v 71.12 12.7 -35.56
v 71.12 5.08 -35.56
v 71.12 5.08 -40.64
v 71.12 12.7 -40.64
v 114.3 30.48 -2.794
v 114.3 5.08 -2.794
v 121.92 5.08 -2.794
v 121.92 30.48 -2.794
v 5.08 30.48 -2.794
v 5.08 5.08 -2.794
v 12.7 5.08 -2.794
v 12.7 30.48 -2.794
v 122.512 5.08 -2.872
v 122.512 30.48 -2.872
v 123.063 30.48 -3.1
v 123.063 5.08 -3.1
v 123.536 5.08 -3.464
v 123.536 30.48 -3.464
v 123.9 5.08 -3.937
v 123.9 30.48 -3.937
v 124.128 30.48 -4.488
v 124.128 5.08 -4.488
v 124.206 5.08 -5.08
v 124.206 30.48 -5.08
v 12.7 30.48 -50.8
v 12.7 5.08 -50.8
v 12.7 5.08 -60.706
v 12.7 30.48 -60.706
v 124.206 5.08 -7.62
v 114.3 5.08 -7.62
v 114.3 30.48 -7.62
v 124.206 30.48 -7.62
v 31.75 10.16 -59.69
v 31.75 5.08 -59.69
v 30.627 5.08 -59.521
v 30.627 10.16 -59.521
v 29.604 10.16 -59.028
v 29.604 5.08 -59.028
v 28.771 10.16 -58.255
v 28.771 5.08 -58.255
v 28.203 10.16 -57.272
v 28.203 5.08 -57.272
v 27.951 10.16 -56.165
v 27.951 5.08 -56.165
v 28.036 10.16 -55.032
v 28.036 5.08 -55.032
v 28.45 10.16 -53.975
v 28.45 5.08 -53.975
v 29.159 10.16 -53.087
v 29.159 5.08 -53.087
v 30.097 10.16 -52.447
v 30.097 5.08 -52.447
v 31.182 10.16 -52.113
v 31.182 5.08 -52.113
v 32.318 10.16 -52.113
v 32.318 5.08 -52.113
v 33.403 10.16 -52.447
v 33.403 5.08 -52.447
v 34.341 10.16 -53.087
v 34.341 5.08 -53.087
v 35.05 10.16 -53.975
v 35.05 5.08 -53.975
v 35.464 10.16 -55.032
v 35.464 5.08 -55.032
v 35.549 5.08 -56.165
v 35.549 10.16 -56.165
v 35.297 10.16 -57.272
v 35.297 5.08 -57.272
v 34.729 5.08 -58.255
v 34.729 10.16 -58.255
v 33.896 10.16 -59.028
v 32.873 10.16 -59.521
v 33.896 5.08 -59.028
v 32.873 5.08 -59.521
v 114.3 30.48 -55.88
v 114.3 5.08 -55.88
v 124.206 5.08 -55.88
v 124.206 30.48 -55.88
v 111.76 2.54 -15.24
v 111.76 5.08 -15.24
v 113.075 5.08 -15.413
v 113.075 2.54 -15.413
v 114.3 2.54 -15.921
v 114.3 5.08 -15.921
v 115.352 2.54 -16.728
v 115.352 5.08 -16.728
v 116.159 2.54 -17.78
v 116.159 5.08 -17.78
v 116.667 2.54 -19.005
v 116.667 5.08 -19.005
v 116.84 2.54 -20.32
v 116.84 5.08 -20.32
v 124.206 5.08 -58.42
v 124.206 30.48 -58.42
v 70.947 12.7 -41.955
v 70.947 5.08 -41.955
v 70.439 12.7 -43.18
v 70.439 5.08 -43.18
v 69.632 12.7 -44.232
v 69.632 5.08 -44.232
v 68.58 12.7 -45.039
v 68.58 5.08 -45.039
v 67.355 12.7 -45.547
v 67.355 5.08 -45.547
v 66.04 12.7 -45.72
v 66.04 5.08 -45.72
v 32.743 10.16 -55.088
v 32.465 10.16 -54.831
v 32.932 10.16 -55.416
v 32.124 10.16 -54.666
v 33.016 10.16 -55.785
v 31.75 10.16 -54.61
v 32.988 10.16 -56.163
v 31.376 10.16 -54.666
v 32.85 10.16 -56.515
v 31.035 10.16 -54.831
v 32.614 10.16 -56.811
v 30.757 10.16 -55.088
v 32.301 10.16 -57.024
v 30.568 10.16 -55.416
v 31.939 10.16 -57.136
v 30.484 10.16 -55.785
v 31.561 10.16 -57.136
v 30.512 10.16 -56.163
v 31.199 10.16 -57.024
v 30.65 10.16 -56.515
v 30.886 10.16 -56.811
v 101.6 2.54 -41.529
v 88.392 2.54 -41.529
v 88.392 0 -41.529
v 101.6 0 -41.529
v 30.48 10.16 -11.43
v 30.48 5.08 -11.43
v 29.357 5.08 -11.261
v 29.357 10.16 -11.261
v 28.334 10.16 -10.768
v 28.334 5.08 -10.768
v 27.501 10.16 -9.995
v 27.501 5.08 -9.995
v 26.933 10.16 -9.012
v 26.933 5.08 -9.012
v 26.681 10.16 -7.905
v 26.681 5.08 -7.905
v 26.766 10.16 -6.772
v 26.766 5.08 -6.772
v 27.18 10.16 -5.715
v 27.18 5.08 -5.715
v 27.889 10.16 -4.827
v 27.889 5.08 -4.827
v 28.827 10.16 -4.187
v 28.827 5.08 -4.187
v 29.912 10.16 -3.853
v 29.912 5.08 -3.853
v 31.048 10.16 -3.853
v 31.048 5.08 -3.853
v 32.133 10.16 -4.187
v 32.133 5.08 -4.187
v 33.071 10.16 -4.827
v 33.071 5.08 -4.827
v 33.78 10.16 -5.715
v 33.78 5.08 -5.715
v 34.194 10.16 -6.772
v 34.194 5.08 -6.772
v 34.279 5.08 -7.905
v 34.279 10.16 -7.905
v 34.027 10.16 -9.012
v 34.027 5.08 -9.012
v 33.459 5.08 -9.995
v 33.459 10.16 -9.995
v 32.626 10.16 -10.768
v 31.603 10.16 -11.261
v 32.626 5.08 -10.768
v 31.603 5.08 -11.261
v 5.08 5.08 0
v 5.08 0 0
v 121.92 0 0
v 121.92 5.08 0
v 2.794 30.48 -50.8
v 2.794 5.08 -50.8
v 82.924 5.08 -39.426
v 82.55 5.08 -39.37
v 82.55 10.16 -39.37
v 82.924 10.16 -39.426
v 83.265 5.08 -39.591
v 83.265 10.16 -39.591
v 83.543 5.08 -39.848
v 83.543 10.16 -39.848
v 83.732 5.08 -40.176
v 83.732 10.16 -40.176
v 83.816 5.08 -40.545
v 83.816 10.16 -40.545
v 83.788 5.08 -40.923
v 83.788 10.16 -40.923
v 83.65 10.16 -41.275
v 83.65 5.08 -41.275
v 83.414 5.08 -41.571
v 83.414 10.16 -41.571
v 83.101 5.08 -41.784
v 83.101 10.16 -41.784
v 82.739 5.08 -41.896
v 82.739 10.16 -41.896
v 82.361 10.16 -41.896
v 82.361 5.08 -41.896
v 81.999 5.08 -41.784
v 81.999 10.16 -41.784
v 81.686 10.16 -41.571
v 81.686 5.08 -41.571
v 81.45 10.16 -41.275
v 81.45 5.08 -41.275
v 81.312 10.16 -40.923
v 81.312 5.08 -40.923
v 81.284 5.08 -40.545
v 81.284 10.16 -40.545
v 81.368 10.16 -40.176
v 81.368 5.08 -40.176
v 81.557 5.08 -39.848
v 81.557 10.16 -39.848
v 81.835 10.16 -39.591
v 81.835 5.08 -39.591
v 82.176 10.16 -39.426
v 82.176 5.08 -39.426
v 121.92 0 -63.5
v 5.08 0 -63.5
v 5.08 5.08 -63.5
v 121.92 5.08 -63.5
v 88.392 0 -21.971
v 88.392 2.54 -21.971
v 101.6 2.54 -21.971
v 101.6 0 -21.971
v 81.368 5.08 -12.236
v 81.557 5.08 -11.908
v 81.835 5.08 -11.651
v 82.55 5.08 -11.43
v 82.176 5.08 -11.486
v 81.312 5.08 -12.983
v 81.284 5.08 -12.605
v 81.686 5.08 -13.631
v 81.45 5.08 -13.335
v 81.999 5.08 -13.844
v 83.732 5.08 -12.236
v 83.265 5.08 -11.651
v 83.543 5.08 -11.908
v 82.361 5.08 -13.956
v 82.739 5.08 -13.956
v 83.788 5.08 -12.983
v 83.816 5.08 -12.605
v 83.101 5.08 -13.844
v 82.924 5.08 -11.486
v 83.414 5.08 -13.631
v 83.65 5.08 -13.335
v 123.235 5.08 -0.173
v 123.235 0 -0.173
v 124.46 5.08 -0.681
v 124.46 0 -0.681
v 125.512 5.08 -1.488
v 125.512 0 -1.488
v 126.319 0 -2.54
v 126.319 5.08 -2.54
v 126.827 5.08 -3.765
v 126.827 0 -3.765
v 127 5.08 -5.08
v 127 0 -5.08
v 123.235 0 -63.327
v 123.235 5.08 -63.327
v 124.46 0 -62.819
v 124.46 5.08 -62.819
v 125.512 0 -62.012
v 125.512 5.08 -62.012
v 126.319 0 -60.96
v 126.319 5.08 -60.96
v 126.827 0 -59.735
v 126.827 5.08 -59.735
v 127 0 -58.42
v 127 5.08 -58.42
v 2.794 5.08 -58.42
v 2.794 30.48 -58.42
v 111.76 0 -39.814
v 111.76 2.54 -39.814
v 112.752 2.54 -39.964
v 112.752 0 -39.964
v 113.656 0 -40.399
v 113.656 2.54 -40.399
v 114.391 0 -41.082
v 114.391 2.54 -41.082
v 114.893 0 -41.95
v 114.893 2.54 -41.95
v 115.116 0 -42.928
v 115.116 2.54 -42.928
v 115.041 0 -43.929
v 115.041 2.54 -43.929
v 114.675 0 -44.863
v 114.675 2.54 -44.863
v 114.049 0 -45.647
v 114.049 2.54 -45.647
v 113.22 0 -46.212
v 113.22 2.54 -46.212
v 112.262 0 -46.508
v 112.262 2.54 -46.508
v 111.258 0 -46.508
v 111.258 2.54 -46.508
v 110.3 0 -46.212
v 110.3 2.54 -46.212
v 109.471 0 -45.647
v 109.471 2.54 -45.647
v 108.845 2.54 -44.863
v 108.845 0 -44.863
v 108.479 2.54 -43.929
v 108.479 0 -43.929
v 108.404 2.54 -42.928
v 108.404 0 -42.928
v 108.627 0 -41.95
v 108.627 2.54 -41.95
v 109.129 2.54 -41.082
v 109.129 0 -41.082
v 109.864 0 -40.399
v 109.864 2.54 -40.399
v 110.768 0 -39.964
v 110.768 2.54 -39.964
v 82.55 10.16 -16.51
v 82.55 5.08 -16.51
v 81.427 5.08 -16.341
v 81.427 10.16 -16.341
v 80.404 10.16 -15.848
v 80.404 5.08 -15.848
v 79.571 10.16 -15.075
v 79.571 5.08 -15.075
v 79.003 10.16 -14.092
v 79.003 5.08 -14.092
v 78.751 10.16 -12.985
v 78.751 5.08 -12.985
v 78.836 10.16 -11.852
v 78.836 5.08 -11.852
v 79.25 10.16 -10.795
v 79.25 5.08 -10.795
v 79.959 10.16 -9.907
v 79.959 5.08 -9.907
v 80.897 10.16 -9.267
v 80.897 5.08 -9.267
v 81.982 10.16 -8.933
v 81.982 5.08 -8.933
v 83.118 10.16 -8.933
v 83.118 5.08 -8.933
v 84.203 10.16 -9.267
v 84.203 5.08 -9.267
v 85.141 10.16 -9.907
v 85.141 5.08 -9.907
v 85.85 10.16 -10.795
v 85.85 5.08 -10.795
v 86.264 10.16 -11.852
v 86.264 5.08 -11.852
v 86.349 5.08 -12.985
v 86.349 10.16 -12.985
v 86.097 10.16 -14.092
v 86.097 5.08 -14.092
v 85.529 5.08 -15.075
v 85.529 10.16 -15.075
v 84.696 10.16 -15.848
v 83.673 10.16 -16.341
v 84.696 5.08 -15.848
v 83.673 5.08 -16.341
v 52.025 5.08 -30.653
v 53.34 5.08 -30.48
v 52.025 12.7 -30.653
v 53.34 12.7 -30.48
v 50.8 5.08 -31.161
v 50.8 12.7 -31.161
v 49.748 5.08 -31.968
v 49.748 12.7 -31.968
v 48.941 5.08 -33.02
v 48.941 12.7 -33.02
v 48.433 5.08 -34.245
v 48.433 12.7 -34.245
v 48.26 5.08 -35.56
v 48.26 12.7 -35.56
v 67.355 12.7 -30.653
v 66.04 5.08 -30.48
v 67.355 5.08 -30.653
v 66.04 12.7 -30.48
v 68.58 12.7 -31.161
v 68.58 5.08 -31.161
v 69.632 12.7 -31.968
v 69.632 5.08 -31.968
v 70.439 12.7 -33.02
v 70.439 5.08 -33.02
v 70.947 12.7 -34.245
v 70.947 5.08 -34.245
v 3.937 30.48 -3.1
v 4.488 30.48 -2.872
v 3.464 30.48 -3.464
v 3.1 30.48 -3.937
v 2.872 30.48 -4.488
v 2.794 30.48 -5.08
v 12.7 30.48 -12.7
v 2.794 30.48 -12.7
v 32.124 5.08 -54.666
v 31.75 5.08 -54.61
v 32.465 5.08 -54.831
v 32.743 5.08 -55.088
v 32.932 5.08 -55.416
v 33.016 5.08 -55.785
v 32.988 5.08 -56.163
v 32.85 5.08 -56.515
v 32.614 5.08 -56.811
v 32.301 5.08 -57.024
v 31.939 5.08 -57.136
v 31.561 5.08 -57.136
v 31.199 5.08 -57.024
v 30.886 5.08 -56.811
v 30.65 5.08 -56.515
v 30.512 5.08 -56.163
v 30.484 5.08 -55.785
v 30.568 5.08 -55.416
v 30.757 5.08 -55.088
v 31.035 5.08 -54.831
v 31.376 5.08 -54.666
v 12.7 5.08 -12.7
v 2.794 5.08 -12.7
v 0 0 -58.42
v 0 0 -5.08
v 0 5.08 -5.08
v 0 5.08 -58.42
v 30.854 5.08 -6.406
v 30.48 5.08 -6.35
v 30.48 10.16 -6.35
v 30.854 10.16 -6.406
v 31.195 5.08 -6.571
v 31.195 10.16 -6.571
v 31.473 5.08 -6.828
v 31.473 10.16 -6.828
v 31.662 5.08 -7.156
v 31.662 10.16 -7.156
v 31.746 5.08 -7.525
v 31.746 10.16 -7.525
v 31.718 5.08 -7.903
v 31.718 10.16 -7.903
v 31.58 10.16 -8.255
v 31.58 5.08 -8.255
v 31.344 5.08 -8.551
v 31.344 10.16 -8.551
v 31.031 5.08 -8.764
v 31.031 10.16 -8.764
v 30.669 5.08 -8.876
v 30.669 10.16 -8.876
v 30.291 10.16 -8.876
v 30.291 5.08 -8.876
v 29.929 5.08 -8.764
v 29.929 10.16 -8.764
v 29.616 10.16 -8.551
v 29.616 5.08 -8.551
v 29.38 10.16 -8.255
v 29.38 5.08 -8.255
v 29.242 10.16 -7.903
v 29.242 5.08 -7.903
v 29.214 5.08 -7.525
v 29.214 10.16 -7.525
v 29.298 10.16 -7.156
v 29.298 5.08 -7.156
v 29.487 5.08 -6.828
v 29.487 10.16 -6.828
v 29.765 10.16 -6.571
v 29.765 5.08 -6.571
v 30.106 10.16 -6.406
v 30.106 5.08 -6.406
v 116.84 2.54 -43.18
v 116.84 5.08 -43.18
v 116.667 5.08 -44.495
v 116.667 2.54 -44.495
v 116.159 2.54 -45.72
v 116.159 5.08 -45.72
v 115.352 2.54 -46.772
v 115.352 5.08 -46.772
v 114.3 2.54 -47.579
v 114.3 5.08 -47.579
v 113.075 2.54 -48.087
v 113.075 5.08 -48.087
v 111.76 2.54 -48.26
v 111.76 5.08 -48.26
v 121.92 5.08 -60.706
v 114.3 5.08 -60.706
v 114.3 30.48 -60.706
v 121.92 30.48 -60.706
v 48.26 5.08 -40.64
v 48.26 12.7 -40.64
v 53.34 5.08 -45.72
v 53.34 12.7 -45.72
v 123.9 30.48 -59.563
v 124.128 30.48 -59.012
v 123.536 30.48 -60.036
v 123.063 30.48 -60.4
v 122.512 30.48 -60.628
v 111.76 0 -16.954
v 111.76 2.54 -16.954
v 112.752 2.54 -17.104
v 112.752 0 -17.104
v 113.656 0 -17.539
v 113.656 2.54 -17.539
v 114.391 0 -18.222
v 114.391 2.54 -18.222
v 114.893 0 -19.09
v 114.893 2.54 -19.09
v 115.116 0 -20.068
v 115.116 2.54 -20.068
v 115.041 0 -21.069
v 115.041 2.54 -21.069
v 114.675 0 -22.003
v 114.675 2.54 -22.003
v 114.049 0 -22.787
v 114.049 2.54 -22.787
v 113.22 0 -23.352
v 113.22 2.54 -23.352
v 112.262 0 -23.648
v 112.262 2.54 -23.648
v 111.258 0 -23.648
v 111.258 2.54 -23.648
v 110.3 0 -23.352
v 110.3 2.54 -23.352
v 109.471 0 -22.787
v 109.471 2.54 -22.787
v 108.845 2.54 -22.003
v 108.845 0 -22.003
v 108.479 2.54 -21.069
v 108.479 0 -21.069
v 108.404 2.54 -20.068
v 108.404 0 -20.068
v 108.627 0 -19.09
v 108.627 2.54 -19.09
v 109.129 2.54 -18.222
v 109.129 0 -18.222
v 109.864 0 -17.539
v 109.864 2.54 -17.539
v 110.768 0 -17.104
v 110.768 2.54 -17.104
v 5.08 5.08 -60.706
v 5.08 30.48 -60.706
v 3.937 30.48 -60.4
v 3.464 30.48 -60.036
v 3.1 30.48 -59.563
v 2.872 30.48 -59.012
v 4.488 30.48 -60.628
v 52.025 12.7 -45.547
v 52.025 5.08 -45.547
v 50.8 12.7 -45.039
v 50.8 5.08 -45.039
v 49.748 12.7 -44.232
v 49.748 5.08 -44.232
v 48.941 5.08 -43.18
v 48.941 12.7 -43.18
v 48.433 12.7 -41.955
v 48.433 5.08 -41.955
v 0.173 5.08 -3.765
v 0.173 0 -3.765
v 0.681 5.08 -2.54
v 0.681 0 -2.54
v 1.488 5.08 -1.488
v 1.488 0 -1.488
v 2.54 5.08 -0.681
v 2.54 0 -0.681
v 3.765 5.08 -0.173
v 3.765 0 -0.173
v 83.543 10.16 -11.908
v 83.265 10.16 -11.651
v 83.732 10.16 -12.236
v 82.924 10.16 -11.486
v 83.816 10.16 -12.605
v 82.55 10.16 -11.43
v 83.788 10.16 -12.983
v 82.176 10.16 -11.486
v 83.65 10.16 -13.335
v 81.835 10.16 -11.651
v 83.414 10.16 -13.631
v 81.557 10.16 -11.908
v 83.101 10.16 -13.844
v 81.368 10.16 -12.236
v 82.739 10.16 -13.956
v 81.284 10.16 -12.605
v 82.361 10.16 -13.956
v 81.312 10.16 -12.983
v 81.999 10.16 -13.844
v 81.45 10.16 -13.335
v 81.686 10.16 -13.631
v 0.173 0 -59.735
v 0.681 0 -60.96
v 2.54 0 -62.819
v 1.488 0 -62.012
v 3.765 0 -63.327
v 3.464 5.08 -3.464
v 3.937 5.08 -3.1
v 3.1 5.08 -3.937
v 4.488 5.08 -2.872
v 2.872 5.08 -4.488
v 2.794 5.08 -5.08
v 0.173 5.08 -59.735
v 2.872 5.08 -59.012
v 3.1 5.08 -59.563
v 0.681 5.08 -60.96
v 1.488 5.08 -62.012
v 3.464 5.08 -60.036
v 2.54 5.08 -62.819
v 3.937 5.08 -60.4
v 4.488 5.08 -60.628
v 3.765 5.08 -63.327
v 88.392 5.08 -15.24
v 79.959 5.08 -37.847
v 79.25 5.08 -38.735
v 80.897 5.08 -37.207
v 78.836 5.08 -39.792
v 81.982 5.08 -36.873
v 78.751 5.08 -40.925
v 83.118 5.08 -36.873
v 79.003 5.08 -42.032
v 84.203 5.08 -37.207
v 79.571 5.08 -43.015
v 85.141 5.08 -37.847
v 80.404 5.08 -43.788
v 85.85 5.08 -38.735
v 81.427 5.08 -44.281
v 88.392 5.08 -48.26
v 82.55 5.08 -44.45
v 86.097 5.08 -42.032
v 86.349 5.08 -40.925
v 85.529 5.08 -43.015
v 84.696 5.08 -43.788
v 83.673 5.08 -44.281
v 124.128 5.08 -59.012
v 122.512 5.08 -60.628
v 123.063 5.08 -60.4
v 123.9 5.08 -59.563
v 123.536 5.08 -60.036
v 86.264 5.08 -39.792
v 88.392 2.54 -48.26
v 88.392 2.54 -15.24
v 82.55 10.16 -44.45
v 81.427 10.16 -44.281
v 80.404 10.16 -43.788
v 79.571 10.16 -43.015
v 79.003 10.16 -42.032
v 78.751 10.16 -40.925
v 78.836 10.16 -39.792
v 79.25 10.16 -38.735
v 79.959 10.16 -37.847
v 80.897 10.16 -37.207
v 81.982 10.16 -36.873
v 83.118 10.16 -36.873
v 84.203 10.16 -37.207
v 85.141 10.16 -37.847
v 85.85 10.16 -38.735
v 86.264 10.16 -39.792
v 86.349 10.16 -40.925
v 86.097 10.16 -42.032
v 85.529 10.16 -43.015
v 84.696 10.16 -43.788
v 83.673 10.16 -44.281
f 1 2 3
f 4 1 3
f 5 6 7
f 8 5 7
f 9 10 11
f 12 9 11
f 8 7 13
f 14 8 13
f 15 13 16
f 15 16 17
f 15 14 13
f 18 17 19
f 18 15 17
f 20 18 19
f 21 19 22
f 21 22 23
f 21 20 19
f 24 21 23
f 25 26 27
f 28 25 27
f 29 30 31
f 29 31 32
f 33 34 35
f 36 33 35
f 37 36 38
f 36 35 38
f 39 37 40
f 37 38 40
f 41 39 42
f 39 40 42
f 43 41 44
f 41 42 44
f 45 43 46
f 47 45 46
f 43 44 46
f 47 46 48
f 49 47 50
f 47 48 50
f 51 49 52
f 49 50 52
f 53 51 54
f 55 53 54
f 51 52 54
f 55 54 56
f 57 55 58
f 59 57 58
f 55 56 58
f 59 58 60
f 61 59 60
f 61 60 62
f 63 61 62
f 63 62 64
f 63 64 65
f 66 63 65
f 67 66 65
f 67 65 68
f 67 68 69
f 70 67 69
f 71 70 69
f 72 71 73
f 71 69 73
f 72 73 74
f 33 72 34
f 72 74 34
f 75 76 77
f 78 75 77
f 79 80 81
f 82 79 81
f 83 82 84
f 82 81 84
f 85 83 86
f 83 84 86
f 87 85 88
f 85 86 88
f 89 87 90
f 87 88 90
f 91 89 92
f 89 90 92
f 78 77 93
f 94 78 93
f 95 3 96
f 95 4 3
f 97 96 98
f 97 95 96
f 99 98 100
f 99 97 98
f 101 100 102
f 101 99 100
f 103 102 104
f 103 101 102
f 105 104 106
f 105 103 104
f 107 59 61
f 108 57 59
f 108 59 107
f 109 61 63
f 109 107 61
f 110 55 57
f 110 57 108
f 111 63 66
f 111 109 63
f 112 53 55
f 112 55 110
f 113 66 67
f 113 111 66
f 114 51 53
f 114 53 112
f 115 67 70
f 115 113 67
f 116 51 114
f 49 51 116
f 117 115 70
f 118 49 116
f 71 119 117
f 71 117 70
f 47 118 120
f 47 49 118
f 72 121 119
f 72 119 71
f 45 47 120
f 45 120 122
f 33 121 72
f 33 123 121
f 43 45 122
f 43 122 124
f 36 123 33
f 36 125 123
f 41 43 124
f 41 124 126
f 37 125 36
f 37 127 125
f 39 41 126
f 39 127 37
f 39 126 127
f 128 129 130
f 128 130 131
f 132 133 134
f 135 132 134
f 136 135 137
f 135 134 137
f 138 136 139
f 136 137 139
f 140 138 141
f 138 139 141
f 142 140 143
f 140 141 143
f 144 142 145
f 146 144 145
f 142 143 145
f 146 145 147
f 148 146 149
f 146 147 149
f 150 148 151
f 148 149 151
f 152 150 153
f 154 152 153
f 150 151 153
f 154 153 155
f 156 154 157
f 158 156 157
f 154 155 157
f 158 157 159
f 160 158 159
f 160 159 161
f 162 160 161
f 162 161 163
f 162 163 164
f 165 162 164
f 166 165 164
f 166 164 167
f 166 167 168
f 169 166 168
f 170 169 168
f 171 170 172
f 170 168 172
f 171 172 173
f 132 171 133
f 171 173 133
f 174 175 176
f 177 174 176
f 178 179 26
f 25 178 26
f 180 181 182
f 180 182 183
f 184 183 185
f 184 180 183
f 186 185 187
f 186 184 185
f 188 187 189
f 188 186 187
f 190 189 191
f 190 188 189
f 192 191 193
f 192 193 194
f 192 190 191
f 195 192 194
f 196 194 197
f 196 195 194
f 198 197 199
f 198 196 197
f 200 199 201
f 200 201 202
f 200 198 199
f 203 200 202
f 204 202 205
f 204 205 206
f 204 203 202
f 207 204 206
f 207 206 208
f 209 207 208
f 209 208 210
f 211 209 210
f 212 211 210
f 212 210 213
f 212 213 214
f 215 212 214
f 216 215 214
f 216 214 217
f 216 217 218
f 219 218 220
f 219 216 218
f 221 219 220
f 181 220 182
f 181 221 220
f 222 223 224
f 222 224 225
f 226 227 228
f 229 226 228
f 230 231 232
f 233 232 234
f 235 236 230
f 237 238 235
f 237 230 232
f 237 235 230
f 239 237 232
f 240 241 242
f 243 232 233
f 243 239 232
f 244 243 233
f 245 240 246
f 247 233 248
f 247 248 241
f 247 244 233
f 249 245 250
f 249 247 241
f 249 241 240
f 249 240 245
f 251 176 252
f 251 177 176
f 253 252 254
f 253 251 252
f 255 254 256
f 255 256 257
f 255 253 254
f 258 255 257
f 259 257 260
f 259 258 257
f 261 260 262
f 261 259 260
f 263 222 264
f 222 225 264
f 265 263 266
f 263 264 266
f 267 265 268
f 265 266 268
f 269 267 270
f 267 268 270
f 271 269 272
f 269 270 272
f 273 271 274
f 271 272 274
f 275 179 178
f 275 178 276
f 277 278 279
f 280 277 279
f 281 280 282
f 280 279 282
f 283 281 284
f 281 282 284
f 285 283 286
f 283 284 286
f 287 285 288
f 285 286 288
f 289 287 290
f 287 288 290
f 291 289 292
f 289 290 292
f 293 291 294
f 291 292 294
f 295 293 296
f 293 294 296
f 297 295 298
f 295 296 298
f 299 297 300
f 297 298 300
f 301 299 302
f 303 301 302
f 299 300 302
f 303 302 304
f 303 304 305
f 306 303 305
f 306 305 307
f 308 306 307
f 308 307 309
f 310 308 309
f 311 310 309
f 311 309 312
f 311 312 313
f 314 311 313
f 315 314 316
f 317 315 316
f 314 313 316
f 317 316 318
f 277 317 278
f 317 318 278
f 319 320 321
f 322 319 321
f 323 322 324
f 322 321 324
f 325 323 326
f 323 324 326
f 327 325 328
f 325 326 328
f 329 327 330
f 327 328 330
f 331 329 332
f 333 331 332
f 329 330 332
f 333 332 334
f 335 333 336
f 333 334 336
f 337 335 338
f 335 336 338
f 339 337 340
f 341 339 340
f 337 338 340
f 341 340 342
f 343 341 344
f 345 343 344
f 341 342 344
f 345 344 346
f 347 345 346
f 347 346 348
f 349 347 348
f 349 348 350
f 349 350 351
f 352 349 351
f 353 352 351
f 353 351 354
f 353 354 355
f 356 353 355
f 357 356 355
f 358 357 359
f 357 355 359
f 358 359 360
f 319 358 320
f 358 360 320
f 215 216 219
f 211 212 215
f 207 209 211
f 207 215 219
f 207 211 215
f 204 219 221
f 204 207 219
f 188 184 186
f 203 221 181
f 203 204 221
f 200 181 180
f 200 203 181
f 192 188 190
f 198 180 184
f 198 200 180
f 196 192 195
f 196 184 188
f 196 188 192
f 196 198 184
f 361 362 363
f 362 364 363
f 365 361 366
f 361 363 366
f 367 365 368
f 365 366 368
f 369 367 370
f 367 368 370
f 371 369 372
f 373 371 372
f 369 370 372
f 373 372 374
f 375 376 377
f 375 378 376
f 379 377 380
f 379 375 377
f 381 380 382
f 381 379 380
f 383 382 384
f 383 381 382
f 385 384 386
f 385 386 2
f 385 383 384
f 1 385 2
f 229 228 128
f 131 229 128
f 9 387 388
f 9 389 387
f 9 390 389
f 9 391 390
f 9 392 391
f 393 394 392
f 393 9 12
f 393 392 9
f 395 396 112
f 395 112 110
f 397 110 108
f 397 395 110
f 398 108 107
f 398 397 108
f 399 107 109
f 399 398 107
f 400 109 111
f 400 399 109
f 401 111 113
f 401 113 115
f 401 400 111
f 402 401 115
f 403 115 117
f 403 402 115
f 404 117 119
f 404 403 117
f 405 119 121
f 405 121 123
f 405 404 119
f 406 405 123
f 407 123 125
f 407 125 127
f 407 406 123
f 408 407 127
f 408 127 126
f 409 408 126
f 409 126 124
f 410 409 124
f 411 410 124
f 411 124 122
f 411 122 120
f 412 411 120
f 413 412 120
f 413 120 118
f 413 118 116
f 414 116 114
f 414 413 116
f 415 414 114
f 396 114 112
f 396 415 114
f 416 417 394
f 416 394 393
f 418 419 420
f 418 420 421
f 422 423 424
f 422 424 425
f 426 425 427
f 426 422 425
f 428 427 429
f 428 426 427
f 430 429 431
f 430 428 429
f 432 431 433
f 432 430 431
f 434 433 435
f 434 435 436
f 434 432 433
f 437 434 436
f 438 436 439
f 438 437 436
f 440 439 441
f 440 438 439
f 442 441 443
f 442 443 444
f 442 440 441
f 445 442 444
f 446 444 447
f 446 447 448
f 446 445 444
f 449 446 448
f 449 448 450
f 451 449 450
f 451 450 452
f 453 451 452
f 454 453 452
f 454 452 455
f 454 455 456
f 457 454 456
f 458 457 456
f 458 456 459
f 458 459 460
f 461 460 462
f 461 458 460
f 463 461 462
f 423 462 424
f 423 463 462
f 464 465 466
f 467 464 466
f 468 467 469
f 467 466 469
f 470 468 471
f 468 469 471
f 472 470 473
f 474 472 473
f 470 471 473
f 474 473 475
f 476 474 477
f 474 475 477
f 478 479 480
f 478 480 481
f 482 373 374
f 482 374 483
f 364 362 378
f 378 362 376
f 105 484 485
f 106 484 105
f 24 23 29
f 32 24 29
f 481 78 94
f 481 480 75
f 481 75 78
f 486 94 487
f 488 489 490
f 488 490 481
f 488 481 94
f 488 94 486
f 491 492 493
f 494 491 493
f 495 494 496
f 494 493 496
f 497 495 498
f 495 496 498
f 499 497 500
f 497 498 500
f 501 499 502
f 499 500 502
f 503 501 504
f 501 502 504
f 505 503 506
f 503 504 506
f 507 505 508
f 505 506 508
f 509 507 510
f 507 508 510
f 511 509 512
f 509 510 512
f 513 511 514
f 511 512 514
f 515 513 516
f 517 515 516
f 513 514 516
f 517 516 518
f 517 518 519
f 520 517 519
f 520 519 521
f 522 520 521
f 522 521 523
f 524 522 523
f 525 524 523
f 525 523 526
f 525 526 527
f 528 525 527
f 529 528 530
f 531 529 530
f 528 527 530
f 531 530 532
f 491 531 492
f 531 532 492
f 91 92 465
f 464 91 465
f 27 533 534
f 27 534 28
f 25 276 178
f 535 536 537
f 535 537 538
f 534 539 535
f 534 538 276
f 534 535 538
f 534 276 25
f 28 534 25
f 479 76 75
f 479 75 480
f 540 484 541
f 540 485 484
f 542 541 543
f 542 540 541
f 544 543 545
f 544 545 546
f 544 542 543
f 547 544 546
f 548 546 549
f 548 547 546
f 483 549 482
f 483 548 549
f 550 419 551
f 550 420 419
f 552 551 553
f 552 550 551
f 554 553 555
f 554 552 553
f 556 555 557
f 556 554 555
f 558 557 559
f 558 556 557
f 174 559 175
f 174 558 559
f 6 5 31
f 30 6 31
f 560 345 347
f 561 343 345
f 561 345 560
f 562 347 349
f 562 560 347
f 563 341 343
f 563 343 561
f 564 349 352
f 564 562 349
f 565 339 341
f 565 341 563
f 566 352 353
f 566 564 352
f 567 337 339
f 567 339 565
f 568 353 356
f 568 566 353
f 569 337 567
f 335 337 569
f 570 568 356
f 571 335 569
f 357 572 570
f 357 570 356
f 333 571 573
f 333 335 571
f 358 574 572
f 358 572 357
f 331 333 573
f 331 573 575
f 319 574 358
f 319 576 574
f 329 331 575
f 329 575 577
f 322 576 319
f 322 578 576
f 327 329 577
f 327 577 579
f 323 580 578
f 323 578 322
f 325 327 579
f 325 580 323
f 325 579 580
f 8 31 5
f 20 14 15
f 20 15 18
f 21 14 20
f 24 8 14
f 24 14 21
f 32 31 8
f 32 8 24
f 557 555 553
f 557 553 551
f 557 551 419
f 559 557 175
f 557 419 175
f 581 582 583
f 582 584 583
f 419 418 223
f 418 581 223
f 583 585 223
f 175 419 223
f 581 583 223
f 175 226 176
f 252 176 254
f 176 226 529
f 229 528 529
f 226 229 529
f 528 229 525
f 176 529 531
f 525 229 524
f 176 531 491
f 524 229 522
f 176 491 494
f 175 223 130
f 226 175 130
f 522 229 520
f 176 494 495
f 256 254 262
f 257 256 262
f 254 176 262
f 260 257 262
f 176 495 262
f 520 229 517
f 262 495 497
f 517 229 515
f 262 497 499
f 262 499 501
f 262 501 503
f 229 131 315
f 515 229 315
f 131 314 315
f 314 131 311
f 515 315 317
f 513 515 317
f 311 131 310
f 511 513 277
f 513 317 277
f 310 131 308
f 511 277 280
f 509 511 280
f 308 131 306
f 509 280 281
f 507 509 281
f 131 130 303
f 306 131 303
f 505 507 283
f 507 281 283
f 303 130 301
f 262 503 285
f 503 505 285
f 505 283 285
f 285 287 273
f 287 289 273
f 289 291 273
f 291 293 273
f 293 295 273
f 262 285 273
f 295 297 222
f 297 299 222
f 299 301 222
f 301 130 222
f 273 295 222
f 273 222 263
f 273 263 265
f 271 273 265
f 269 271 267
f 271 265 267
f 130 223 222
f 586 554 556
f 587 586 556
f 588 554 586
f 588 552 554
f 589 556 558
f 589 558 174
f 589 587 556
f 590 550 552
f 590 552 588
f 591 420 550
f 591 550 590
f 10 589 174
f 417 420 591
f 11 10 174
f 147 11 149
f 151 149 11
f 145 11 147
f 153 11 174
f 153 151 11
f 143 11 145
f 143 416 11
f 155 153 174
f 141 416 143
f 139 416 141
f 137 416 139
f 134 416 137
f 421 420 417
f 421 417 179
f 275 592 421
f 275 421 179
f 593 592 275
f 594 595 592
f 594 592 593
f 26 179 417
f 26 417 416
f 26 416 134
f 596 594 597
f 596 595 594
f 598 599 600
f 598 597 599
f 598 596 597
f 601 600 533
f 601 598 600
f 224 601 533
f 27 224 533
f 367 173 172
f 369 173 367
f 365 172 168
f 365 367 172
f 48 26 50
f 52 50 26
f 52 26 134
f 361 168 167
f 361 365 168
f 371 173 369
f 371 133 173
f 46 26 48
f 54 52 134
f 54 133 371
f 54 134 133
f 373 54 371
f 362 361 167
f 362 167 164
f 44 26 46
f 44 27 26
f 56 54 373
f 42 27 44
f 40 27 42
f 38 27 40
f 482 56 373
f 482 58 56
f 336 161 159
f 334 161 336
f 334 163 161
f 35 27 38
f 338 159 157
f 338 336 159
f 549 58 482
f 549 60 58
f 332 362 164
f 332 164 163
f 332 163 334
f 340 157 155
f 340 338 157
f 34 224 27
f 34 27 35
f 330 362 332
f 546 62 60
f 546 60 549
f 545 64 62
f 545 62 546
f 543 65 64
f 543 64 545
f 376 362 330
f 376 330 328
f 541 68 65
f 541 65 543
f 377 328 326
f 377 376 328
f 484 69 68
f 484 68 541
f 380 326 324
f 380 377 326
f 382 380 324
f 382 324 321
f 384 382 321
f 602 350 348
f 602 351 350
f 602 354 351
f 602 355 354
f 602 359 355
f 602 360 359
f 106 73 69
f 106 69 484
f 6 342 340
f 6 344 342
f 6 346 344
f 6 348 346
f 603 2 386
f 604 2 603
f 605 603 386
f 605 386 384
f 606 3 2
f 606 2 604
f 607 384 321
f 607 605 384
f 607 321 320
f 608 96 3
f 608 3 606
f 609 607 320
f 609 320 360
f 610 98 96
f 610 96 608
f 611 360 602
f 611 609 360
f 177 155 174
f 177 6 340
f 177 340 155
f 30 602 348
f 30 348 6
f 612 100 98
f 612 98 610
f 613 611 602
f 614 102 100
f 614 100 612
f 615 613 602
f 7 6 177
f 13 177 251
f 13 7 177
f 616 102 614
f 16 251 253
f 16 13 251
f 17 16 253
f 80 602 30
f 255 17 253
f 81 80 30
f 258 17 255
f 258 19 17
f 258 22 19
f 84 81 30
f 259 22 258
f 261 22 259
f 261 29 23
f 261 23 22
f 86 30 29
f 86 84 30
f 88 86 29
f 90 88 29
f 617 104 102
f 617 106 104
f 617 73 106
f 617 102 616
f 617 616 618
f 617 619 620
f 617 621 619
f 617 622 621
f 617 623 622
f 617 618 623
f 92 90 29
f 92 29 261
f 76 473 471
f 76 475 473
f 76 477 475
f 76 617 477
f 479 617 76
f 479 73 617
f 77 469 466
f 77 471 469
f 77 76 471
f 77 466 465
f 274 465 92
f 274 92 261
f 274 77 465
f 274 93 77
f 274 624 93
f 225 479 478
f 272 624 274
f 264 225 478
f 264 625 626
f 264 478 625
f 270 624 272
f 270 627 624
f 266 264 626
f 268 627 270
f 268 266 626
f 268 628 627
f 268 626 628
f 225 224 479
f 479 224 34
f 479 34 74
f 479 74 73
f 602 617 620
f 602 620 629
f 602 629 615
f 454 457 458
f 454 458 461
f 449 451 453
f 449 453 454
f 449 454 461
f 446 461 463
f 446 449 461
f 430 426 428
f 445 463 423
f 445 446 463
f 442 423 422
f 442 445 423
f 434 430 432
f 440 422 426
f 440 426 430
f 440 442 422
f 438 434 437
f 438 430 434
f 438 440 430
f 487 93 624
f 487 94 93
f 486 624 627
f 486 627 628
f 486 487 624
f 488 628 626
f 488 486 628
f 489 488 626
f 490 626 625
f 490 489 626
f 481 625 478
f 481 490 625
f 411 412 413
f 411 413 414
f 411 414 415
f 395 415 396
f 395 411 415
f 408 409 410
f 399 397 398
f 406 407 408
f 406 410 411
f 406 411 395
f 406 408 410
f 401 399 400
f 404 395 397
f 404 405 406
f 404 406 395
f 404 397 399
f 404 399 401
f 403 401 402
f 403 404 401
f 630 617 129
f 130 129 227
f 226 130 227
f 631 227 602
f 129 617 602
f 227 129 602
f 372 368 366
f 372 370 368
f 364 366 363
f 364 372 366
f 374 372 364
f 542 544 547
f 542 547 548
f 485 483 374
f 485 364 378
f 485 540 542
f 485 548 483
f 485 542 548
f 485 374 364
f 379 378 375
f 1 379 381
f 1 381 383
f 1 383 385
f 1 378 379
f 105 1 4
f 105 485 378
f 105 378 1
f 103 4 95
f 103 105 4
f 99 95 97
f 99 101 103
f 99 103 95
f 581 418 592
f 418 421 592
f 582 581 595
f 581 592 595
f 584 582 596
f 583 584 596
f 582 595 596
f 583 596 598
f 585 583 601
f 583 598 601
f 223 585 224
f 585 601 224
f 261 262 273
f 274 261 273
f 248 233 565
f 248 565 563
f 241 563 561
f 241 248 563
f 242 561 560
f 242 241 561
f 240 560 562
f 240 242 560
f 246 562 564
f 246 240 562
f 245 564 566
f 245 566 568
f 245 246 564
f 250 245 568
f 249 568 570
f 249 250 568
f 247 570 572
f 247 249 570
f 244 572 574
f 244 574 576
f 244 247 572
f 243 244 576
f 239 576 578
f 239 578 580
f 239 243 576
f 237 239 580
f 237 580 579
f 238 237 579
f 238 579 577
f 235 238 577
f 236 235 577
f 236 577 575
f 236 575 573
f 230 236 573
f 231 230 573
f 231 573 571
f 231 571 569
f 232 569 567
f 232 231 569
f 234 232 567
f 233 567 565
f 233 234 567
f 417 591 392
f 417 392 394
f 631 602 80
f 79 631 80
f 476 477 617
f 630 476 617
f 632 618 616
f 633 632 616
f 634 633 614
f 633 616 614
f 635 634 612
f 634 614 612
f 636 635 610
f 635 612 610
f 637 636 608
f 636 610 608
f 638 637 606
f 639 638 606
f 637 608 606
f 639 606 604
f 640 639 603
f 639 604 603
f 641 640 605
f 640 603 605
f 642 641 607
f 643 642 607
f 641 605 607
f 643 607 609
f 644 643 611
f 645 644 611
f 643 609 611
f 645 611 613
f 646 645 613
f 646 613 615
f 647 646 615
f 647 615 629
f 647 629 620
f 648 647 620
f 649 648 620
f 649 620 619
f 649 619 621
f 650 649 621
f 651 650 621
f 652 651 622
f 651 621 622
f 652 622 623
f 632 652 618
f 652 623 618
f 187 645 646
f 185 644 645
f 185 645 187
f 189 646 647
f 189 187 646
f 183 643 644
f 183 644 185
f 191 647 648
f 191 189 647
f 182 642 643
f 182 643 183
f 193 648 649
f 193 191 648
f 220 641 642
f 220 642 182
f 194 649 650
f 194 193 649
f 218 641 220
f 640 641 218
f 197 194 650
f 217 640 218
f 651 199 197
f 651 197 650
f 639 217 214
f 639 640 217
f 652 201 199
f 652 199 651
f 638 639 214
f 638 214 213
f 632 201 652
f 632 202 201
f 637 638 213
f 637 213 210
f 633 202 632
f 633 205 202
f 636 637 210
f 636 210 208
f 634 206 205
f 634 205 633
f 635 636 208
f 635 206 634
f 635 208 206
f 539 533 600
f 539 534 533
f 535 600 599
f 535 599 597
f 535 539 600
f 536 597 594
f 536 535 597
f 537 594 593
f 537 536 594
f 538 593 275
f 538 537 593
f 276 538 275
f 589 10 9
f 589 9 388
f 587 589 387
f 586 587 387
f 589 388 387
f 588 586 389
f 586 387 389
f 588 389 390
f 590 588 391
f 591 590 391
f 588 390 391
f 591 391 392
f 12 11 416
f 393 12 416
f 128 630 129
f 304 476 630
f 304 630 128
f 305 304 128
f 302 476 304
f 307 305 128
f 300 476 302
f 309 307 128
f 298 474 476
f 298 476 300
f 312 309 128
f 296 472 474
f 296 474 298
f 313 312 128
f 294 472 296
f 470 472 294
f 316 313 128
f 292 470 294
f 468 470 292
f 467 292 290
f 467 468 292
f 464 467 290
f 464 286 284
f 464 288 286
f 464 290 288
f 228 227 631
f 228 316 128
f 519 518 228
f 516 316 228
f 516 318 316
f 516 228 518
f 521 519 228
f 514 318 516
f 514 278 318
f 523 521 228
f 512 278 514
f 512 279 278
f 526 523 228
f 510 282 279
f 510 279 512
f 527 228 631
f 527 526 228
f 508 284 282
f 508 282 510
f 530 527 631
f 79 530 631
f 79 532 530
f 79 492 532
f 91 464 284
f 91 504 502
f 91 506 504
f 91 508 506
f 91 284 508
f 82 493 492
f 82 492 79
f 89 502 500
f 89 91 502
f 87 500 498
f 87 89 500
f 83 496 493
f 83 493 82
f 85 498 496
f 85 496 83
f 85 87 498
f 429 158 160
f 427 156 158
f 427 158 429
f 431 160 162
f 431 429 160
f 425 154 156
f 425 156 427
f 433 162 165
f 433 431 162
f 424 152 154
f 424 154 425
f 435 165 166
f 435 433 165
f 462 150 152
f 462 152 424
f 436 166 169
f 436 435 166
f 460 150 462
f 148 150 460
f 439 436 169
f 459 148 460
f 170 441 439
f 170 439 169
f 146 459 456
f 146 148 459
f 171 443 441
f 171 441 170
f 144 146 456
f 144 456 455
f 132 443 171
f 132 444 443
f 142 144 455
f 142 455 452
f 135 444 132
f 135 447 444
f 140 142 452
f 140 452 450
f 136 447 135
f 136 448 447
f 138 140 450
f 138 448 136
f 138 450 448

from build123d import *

# Parameters (mm, degrees)
SKETCH1_W            = 127
SKETCH1_H            = 63.5
BOSS_EXTRUDE1_DEPTH  = 5.08
SKETCH2_W            = 9.906
SKETCH2_H            = 9.906
SKETCH2_H_2          = 4.826
BOSS_EXTRUDE3_DEPTH  = 25.4
FILLET3_R            = 2.286
FILLET4_R            = 5.08
CUT_EXTRUDE8_REACH   = 146.244
SKETCH13_R           = 3.556
SKETCH13_W           = 13.208
SKETCH13_H           = 19.558
SKETCH14_W           = 13.208
SKETCH14_H           = 29.718
CUT_EXTRUDE9_DEPTH   = 2.54
SKETCH19_R           = 5.08
CUT_EXTRUDE12_DEPTH  = 2.54
SKETCH4_R            = 3.81
SKETCH4_R_2          = 1.27
BOSS_EXTRUDE13_DEPTH = 5.08
SKETCH7_W            = 22.86
SKETCH7_H            = 15.24
BOSS_EXTRUDE14_DEPTH = 7.62
FILLET5_R            = 5.08
CUT_EXTRUDE13_DEPTH  = 2.54
SKETCH22_R           = 4.329078616
SKETCH22_R_2         = 3.3655
SKETCH22_R_3         = 4.536345421
BOSS_EXTRUDE15_DEPTH = 2.54


with BuildPart() as part:
    # Sketch1 → Boss-Extrude1 (new body)
    with BuildSketch(Plane(origin=(0, 0, 0), x_dir=(1, 0, 0), z_dir=(0, 1, 0))):
        with Locations((63.5, 31.75)):
            Rectangle(SKETCH1_W, SKETCH1_H)
    extrude(amount=BOSS_EXTRUDE1_DEPTH)

    # Sketch2 → Boss-Extrude3 (add)
    with BuildSketch(Plane(origin=(0, 5.08, 0), x_dir=(1, 0, 0), z_dir=(0, 1, 0))):
        with Locations((7.747, 7.747)):
            Rectangle(SKETCH2_W, SKETCH2_H)
        with Locations((7.747, 55.753)):
            Rectangle(SKETCH2_W, SKETCH2_H)
        with Locations((119.253, 5.207)):
            Rectangle(SKETCH2_W, SKETCH2_H_2)
        with Locations((119.253, 58.293)):
            Rectangle(SKETCH2_W, SKETCH2_H_2)
    extrude(amount=BOSS_EXTRUDE3_DEPTH)

    # Fillet3
    fillet3_edges = [part.edges().sort_by_distance(p)[0] for p in [
        (2.794, 17.78, -60.706),
        (2.794, 17.78, -2.794),
        (124.206, 17.78, -60.706),
        (124.206, 17.78, -2.794),
    ]]
    fillet(fillet3_edges, radius=FILLET3_R)

    # Fillet4
    fillet4_edges = [part.edges().sort_by_distance(p)[0] for p in [
        (0, 2.54, -63.5),
        (127, 2.54, -63.5),
        (127, 2.54, 0),
        (0, 2.54, 0),
    ]]
    fillet(fillet4_edges, radius=FILLET4_R)

    # Sketch13 → Cut-Extrude8 (cut, up to next)
    with BuildSketch(Plane(origin=(0, 5.08, 0), x_dir=(1, 0, 0), z_dir=(0, 1, 0)), mode=Mode.PRIVATE) as cut_extrude8_sk1:
        with Locations(Location((111.76, 43.18, 0), (0, 0, 270))):
            Circle(SKETCH13_R)
    cut_extrude8_tool1 = extrude(cut_extrude8_sk1.sketch, amount=-CUT_EXTRUDE8_REACH, mode=Mode.PRIVATE) & part.part
    # Sketch13 → Cut-Extrude8 (cut, up to next)
    with BuildSketch(Plane(origin=(0, 5.08, 0), x_dir=(1, 0, 0), z_dir=(0, 1, 0)), mode=Mode.PRIVATE) as cut_extrude8_sk2:
        with Locations(Location((111.76, 20.32, 0), (0, 0, 270))):
            Circle(SKETCH13_R)
    cut_extrude8_tool2 = extrude(cut_extrude8_sk2.sketch, amount=-CUT_EXTRUDE8_REACH, mode=Mode.PRIVATE) & part.part
    # Sketch13 → Cut-Extrude8 (cut, up to next)
    with BuildSketch(Plane(origin=(0, 5.08, 0), x_dir=(1, 0, 0), z_dir=(0, 1, 0)), mode=Mode.PRIVATE) as cut_extrude8_sk3:
        with Locations((94.996, 31.75)):
            Rectangle(SKETCH13_W, SKETCH13_H)
    cut_extrude8_tool3 = extrude(cut_extrude8_sk3.sketch, amount=-CUT_EXTRUDE8_REACH, mode=Mode.PRIVATE) & part.part
    add(cut_extrude8_tool1.solids().sort_by_distance((111.76, 5.08, -43.18))[0], mode=Mode.SUBTRACT)
    add(cut_extrude8_tool2.solids().sort_by_distance((111.76, 5.08, -20.32))[0], mode=Mode.SUBTRACT)
    add(cut_extrude8_tool3.solids().sort_by_distance((94.996, 5.08, -31.75))[0], mode=Mode.SUBTRACT)

    # Sketch14 → Cut-Extrude9 (cut)
    with BuildSketch(Plane(origin=(0, 5.08, 0), x_dir=(1, 0, 0), z_dir=(0, 1, 0))):
        with Locations((94.996, 31.75)):
            Rectangle(SKETCH14_W, SKETCH14_H)
    extrude(amount=-CUT_EXTRUDE9_DEPTH, mode=Mode.SUBTRACT)

    # Sketch19 → Cut-Extrude12 (cut)
    with BuildSketch(Plane(origin=(0, 5.08, 0), x_dir=(1, 0, 0), z_dir=(0, 1, 0))):
        with Locations(Location((111.76, 43.18, 0), (0, 0, 270))):
            Circle(SKETCH19_R)
        with Locations(Location((111.76, 20.32, 0), (0, 0, 270))):
            Circle(SKETCH19_R)
    extrude(amount=-CUT_EXTRUDE12_DEPTH, mode=Mode.SUBTRACT)

    # Sketch4 → Boss-Extrude13 (add)
    # profile 1 of 4: a face of its own
    with BuildSketch(Plane(origin=(0, 5.08, 0), x_dir=(1, 0, 0), z_dir=(0, 1, 0))):
        with Locations(Location((31.75, 55.88, 0), (0, 0, 90))):
            Circle(SKETCH4_R)
        with Locations(Location((31.75, 55.88, 0), (0, 0, 270))):
            Circle(SKETCH4_R_2, mode=Mode.SUBTRACT)
    # profile 2 of 4: a face of its own
    with BuildSketch(Plane(origin=(0, 5.08, 0), x_dir=(1, 0, 0), z_dir=(0, 1, 0))):
        with Locations(Location((30.48, 7.62, 0), (0, 0, 90))):
            Circle(SKETCH4_R)
        with Locations(Location((30.48, 7.62, 0), (0, 0, 270))):
            Circle(SKETCH4_R_2, mode=Mode.SUBTRACT)
    # profile 3 of 4: a face of its own
    with BuildSketch(Plane(origin=(0, 5.08, 0), x_dir=(1, 0, 0), z_dir=(0, 1, 0))):
        with Locations(Location((82.55, 40.64, 0), (0, 0, 90))):
            Circle(SKETCH4_R)
        with Locations(Location((82.55, 40.64, 0), (0, 0, 270))):
            Circle(SKETCH4_R_2, mode=Mode.SUBTRACT)
    # profile 4 of 4: a face of its own
    with BuildSketch(Plane(origin=(0, 5.08, 0), x_dir=(1, 0, 0), z_dir=(0, 1, 0))):
        with Locations(Location((82.55, 12.7, 0), (0, 0, 90))):
            Circle(SKETCH4_R)
        with Locations(Location((82.55, 12.7, 0), (0, 0, 270))):
            Circle(SKETCH4_R_2, mode=Mode.SUBTRACT)
    extrude(amount=BOSS_EXTRUDE13_DEPTH)

    # Sketch7 → Boss-Extrude14 (add)
    with BuildSketch(Plane(origin=(0, 5.08, 0), x_dir=(1, 0, 0), z_dir=(0, 1, 0))):
        with Locations((59.69, 38.1)):
            Rectangle(SKETCH7_W, SKETCH7_H)
    extrude(amount=BOSS_EXTRUDE14_DEPTH)

    # Fillet5
    fillet5_edges = [part.edges().sort_by_distance(p)[0] for p in [
        (48.26, 8.89, -45.72),
        (48.26, 8.89, -30.48),
        (71.12, 8.89, -30.48),
        (71.12, 8.89, -45.72),
    ]]
    fillet(fillet5_edges, radius=FILLET5_R)

    # Sketch21 → Cut-Extrude13 (cut)
    with BuildSketch(Plane(origin=(0, 5.08, 0), x_dir=(1, 0, 0), z_dir=(0, 1, 0))):
        with BuildLine():
            Line((111.76, 48.26), (88.392, 48.26))
            Line((88.392, 48.26), (88.392, 15.24))
            Line((88.392, 15.24), (111.76, 15.24))
            ThreePointArc((111.76, 15.24), (115.352102448, 16.727897552), (116.84, 20.32))
            Line((116.84, 20.32), (116.84, 43.18))
            ThreePointArc((116.84, 43.18), (115.352102448, 46.772102448), (111.76, 48.26))
        make_face()
    extrude(amount=-CUT_EXTRUDE13_DEPTH, mode=Mode.SUBTRACT)

    # Sketch22 → Boss-Extrude15 (add)
    # profile 1 of 2: a face of its own
    with BuildSketch(Plane(origin=(0, 2.54, 0), x_dir=(1, 0, 0), z_dir=(0, 1, 0))):
        with Locations((111.76, 43.18)):
            Circle(SKETCH22_R)
        with Locations(Location((111.76, 43.18, 0), (0, 0, 270))):
            Circle(SKETCH22_R_2, mode=Mode.SUBTRACT)
    # profile 2 of 2: a face of its own
    with BuildSketch(Plane(origin=(0, 2.54, 0), x_dir=(1, 0, 0), z_dir=(0, 1, 0))):
        with Locations((111.76, 20.32)):
            Circle(SKETCH22_R_3)
        with Locations(Location((111.76, 20.32, 0), (0, 0, 270))):
            Circle(SKETCH22_R_2, mode=Mode.SUBTRACT)
    extrude(amount=-BOSS_EXTRUDE15_DEPTH)


solid = part.part
